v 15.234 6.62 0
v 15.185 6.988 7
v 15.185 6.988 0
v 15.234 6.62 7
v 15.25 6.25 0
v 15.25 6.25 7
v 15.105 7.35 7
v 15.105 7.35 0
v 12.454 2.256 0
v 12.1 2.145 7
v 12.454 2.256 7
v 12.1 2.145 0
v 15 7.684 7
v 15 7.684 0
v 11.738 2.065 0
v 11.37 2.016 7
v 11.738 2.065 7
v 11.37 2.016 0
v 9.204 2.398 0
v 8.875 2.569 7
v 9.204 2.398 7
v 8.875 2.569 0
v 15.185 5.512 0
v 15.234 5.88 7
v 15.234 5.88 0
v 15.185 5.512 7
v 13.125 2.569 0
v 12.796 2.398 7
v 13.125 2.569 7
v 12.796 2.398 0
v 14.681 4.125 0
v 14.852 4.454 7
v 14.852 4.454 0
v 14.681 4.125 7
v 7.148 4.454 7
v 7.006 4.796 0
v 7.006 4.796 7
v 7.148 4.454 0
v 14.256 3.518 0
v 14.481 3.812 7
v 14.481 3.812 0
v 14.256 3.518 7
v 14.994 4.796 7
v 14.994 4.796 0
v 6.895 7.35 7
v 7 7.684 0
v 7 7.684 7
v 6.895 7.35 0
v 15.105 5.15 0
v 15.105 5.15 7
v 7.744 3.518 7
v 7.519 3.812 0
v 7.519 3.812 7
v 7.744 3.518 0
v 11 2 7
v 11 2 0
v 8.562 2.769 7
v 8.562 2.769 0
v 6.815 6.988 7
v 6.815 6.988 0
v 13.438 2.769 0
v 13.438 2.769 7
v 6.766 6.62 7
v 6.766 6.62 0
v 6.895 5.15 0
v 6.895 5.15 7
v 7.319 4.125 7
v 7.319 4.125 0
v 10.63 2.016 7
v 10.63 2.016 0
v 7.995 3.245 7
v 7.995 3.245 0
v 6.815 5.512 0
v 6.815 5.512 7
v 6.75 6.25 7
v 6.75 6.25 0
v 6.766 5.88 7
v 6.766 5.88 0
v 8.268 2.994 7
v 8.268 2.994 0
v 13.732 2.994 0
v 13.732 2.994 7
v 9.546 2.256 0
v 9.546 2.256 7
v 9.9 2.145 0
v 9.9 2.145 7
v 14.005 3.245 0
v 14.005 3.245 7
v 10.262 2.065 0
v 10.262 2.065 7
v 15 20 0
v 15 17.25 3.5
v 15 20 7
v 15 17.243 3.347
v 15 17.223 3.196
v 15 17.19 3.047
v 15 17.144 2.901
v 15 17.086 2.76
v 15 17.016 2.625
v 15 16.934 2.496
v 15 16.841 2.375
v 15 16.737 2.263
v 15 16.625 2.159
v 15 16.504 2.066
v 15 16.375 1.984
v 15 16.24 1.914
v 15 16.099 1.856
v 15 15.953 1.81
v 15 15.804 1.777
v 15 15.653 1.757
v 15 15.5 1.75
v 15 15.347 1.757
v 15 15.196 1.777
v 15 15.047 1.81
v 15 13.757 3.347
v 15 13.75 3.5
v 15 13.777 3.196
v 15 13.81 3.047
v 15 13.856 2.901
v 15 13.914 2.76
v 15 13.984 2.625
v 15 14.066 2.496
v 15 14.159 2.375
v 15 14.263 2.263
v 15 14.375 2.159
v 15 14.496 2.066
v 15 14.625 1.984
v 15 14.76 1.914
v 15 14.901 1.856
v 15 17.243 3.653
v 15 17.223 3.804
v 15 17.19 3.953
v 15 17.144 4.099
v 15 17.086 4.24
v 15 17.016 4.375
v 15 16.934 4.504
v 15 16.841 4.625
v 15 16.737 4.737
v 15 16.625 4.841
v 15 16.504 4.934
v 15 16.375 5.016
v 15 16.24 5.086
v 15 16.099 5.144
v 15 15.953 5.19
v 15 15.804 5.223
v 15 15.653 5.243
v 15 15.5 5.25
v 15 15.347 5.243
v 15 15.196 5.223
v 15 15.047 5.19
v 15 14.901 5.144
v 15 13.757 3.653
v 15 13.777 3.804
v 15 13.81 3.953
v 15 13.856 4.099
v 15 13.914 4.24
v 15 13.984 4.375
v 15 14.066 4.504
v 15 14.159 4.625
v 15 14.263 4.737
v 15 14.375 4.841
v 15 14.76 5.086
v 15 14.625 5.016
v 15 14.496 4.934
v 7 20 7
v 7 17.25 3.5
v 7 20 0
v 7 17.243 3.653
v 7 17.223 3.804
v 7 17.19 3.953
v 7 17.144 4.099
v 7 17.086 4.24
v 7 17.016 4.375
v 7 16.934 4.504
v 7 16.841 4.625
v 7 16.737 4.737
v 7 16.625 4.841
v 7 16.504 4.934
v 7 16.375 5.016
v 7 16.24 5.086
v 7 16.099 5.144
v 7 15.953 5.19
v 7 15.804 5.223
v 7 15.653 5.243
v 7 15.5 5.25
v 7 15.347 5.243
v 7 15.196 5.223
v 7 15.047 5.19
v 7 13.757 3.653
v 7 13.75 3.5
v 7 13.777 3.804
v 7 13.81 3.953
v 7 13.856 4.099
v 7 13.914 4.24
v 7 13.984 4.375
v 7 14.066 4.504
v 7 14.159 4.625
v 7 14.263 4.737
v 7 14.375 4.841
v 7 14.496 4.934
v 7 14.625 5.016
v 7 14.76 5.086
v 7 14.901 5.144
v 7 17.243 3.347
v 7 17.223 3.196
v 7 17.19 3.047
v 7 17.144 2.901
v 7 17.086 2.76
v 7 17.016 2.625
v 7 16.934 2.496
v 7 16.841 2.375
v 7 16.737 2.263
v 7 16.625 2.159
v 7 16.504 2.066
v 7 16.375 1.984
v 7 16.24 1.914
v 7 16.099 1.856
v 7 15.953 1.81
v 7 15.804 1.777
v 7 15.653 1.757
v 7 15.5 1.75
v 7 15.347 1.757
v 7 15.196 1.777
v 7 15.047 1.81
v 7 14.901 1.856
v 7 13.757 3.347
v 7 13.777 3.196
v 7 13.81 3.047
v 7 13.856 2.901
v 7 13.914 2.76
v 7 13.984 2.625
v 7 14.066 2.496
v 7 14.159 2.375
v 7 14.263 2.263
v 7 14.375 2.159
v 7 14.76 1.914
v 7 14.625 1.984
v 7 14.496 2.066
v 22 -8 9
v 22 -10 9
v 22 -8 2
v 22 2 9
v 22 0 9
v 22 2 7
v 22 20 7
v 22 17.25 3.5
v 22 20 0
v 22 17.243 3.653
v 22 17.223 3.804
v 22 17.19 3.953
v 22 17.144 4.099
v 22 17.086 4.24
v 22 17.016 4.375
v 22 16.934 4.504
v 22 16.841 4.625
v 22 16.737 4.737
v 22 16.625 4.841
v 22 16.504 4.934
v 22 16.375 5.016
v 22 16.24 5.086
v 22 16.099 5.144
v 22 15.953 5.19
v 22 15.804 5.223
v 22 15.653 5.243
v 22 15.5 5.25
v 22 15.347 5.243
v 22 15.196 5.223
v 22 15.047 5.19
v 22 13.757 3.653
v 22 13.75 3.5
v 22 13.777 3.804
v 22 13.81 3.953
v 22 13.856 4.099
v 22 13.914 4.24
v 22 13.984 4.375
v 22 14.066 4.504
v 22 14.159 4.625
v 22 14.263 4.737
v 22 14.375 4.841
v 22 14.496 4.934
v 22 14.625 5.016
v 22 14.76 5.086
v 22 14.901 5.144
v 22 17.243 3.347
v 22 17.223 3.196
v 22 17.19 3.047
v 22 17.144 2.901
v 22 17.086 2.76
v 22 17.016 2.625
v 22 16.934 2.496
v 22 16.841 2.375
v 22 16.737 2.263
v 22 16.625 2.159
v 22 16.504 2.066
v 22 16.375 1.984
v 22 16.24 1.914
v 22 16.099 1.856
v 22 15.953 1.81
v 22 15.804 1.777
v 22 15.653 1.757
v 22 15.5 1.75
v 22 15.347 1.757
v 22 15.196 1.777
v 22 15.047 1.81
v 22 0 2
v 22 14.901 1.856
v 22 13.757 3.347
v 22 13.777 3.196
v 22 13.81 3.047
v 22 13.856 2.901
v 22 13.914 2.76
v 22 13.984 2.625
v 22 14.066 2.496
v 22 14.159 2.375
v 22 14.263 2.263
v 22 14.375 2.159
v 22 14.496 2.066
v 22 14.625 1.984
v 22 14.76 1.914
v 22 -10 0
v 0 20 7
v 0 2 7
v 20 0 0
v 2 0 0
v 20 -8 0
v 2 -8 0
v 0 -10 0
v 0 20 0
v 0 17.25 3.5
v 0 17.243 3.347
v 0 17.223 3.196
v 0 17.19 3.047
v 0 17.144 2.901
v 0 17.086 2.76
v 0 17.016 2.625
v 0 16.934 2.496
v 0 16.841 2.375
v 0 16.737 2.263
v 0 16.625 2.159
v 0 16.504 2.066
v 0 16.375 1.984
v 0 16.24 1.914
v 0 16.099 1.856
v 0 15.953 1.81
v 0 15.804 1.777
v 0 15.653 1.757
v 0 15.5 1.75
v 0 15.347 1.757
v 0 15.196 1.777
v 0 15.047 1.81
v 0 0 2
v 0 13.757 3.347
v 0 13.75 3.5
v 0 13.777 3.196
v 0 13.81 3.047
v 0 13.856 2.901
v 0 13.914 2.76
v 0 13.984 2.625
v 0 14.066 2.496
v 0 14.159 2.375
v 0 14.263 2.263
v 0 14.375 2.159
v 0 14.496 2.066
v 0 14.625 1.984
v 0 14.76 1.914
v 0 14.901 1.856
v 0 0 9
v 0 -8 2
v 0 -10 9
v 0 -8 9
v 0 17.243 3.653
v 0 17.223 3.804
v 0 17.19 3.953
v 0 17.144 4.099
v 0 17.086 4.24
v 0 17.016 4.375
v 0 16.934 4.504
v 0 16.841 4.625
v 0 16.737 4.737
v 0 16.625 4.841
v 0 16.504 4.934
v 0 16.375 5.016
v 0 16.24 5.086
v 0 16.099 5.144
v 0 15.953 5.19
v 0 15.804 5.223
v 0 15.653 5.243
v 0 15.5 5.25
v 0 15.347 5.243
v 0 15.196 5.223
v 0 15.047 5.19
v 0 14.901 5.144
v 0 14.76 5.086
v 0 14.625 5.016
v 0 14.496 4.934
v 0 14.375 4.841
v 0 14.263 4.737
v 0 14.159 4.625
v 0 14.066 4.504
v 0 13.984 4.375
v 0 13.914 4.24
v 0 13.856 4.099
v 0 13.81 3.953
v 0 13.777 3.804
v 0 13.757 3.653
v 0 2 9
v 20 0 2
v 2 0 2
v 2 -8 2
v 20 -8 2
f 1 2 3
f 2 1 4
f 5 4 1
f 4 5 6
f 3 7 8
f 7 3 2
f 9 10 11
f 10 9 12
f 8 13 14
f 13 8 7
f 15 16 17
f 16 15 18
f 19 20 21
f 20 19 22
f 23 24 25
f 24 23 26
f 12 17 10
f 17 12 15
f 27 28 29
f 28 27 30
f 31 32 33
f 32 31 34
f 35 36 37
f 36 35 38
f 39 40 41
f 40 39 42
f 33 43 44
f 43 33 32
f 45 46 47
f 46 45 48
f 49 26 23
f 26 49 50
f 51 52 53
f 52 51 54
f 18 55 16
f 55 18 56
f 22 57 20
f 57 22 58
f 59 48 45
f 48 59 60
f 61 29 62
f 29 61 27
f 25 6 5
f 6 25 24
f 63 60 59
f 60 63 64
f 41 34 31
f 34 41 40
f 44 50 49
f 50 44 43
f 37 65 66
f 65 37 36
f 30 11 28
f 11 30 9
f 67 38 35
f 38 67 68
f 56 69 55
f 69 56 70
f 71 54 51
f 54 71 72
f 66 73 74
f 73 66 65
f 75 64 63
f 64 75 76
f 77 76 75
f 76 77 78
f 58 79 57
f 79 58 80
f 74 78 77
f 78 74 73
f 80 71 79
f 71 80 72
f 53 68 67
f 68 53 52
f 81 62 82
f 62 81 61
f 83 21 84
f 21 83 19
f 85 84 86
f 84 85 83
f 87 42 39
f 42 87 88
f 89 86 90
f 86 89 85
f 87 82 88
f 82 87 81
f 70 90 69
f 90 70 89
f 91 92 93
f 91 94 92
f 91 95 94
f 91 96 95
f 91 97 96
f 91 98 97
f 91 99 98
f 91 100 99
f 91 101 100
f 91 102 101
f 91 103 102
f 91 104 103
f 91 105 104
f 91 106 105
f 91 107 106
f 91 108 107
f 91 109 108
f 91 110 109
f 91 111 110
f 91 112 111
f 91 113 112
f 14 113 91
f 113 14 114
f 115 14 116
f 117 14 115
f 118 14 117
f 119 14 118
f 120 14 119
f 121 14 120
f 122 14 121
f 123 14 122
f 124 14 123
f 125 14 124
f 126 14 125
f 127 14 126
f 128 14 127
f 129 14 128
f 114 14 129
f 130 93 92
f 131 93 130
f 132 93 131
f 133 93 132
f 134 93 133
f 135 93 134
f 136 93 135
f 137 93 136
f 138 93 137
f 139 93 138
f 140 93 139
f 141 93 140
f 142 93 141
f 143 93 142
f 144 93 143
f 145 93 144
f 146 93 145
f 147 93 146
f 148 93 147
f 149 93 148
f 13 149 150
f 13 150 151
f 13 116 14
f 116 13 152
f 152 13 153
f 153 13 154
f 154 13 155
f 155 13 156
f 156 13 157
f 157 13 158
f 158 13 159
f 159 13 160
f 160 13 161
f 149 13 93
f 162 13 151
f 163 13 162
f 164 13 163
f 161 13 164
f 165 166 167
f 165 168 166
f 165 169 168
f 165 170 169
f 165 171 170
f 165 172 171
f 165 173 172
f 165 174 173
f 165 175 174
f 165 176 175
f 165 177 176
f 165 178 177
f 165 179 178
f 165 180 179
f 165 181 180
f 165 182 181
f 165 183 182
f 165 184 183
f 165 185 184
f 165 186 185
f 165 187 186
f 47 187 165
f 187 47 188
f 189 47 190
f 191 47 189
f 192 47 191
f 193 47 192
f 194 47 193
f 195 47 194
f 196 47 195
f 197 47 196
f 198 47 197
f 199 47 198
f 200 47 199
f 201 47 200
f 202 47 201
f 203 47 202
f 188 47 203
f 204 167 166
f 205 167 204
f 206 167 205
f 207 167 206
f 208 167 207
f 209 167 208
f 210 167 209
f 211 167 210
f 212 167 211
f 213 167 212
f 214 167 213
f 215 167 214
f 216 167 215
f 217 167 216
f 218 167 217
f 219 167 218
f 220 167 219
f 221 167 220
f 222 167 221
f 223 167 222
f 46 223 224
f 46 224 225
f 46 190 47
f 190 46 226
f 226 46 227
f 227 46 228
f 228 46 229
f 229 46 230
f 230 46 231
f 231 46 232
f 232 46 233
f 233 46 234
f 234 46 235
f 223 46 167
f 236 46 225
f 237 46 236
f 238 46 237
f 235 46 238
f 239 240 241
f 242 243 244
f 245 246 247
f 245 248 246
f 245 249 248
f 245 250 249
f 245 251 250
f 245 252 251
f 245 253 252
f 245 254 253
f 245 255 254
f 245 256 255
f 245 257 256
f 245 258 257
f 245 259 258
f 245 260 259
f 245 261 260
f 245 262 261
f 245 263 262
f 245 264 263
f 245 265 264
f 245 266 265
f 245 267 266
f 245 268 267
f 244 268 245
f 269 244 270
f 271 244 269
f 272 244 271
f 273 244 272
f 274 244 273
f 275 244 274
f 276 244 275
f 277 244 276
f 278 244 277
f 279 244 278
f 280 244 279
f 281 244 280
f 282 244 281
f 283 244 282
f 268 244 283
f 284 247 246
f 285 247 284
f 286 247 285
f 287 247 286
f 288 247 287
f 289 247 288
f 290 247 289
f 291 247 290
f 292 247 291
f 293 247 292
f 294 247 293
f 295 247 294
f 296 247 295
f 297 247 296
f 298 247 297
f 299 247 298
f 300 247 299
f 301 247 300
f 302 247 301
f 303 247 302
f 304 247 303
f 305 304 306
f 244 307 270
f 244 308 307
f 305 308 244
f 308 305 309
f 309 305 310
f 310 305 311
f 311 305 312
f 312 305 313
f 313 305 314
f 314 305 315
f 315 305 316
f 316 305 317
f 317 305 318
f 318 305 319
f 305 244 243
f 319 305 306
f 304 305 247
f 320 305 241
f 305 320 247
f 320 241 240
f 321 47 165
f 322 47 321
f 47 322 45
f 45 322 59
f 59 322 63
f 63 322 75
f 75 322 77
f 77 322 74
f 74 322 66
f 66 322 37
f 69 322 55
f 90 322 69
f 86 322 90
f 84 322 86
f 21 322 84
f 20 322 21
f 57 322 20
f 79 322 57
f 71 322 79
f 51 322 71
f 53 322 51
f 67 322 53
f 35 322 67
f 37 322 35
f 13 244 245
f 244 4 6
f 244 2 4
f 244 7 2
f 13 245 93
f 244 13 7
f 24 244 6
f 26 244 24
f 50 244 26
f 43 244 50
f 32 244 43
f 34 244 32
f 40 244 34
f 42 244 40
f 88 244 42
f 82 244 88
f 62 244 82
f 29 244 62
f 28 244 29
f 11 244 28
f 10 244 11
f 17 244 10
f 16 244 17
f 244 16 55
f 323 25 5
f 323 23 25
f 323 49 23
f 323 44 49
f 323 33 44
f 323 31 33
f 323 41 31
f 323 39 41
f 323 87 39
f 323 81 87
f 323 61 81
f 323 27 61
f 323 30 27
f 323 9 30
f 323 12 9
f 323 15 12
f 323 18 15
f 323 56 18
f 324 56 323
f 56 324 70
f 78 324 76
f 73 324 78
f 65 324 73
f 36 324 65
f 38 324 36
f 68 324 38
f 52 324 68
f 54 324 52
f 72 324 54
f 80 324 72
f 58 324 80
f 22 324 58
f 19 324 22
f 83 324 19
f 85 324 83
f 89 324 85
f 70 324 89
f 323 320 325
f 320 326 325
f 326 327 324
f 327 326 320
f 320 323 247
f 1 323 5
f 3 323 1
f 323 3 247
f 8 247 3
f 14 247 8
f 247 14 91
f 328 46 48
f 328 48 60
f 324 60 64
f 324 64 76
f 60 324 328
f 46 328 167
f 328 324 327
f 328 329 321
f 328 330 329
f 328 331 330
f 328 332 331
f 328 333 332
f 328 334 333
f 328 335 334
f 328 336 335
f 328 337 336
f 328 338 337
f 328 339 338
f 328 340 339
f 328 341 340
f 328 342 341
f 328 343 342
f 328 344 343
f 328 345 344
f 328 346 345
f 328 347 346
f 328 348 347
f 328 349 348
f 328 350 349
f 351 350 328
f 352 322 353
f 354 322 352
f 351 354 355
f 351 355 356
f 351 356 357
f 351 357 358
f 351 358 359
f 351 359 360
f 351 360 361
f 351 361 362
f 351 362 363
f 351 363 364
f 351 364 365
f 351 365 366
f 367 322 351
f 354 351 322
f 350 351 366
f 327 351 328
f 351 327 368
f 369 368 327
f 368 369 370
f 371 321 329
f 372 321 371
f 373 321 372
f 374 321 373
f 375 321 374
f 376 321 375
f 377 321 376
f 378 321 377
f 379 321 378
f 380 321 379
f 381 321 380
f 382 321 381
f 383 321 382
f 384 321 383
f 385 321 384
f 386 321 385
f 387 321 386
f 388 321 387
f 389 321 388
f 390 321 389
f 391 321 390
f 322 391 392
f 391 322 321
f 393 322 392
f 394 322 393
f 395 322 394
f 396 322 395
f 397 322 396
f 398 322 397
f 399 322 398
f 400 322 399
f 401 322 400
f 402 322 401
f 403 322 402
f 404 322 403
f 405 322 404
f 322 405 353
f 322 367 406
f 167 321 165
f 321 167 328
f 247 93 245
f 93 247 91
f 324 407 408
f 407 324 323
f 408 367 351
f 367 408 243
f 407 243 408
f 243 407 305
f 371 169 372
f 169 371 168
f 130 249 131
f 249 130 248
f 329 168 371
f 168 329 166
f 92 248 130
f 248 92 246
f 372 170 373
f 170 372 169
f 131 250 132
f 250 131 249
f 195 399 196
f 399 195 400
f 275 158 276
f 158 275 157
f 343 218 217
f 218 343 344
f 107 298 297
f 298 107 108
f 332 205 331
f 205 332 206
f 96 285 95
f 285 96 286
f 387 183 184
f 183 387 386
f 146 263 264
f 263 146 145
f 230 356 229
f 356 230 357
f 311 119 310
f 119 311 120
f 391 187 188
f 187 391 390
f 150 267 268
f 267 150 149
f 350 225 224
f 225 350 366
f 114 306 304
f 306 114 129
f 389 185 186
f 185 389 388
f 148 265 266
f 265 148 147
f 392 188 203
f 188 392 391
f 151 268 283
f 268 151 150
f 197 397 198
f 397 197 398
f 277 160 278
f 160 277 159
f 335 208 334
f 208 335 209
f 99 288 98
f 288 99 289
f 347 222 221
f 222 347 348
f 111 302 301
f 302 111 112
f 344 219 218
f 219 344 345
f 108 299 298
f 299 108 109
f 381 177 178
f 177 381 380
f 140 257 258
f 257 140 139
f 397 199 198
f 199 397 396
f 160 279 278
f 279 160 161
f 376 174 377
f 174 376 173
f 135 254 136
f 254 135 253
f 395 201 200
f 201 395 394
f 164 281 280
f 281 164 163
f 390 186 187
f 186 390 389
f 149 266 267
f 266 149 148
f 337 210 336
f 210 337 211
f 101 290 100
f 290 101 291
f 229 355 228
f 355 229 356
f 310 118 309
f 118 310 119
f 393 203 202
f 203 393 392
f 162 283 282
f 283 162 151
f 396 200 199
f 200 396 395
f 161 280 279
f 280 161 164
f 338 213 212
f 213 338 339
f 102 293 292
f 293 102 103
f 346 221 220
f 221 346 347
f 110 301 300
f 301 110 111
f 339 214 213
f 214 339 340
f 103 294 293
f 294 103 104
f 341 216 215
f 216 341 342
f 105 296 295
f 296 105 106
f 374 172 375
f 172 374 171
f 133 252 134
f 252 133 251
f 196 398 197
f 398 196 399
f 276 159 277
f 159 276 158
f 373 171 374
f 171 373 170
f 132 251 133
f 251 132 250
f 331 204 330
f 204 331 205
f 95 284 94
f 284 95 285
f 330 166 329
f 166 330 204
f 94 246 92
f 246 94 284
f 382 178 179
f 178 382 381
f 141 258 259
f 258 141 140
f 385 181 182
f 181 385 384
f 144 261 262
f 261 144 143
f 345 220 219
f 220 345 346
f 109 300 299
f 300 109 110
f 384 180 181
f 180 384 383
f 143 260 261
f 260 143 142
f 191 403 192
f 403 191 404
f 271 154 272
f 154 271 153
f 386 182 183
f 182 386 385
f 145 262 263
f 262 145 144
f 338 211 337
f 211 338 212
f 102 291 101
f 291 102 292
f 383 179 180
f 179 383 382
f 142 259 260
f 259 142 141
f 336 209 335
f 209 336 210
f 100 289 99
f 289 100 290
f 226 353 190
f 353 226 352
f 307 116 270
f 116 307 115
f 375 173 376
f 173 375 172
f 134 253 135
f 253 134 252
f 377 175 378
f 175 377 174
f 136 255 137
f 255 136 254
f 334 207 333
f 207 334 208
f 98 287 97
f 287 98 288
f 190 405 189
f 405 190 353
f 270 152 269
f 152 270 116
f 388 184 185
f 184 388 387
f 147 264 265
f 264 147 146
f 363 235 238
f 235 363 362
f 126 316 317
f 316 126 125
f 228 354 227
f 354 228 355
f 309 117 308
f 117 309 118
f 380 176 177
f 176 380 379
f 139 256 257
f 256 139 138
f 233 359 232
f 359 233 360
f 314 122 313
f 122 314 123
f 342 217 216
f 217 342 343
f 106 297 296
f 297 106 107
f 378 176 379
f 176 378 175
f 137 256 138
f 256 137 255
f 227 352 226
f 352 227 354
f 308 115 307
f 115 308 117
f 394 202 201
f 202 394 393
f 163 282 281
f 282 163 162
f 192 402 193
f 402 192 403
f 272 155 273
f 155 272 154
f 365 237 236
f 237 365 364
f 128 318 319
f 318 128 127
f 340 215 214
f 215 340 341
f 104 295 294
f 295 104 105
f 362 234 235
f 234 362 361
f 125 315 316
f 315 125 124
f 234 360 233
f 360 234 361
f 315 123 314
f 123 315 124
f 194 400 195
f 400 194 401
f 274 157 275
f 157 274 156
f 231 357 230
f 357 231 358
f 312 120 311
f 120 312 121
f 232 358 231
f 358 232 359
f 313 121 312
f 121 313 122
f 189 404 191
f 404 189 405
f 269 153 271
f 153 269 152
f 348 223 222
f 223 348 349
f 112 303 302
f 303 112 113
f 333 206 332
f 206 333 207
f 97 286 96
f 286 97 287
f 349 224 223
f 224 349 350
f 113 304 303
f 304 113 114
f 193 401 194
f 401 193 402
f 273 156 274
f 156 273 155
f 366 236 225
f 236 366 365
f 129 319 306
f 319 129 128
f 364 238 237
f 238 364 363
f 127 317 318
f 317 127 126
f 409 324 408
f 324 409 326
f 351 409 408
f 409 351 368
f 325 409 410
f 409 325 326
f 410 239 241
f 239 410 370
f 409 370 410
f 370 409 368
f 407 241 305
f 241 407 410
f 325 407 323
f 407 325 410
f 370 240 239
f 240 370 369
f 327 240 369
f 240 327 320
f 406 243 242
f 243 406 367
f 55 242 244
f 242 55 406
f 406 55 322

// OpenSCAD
$fa=5; $fs=0.1;

difference(){
    cube([22, 20, 7]);
    
    {
    translate([11, 6.25, 3.5])
       {cylinder(r=4.25, h=7.01, center=true);
        translate([0, 7.125, 0])
           cube([8, 13.26, 7.01], center=true);
       }
    
    translate([11, 15.5, 3.5])
       rotate([90, 0, 90])
        cylinder(h=22.01, r=1.75, center=true);
    }
}

translate([0, -8, 0])
    cube([2, 8, 2]);

translate([20, -8, 0])
    cube([2, 8, 2]);

translate([0, -10, 0])
    cube([22, 2, 9]);

cube([22, 2, 9]);
